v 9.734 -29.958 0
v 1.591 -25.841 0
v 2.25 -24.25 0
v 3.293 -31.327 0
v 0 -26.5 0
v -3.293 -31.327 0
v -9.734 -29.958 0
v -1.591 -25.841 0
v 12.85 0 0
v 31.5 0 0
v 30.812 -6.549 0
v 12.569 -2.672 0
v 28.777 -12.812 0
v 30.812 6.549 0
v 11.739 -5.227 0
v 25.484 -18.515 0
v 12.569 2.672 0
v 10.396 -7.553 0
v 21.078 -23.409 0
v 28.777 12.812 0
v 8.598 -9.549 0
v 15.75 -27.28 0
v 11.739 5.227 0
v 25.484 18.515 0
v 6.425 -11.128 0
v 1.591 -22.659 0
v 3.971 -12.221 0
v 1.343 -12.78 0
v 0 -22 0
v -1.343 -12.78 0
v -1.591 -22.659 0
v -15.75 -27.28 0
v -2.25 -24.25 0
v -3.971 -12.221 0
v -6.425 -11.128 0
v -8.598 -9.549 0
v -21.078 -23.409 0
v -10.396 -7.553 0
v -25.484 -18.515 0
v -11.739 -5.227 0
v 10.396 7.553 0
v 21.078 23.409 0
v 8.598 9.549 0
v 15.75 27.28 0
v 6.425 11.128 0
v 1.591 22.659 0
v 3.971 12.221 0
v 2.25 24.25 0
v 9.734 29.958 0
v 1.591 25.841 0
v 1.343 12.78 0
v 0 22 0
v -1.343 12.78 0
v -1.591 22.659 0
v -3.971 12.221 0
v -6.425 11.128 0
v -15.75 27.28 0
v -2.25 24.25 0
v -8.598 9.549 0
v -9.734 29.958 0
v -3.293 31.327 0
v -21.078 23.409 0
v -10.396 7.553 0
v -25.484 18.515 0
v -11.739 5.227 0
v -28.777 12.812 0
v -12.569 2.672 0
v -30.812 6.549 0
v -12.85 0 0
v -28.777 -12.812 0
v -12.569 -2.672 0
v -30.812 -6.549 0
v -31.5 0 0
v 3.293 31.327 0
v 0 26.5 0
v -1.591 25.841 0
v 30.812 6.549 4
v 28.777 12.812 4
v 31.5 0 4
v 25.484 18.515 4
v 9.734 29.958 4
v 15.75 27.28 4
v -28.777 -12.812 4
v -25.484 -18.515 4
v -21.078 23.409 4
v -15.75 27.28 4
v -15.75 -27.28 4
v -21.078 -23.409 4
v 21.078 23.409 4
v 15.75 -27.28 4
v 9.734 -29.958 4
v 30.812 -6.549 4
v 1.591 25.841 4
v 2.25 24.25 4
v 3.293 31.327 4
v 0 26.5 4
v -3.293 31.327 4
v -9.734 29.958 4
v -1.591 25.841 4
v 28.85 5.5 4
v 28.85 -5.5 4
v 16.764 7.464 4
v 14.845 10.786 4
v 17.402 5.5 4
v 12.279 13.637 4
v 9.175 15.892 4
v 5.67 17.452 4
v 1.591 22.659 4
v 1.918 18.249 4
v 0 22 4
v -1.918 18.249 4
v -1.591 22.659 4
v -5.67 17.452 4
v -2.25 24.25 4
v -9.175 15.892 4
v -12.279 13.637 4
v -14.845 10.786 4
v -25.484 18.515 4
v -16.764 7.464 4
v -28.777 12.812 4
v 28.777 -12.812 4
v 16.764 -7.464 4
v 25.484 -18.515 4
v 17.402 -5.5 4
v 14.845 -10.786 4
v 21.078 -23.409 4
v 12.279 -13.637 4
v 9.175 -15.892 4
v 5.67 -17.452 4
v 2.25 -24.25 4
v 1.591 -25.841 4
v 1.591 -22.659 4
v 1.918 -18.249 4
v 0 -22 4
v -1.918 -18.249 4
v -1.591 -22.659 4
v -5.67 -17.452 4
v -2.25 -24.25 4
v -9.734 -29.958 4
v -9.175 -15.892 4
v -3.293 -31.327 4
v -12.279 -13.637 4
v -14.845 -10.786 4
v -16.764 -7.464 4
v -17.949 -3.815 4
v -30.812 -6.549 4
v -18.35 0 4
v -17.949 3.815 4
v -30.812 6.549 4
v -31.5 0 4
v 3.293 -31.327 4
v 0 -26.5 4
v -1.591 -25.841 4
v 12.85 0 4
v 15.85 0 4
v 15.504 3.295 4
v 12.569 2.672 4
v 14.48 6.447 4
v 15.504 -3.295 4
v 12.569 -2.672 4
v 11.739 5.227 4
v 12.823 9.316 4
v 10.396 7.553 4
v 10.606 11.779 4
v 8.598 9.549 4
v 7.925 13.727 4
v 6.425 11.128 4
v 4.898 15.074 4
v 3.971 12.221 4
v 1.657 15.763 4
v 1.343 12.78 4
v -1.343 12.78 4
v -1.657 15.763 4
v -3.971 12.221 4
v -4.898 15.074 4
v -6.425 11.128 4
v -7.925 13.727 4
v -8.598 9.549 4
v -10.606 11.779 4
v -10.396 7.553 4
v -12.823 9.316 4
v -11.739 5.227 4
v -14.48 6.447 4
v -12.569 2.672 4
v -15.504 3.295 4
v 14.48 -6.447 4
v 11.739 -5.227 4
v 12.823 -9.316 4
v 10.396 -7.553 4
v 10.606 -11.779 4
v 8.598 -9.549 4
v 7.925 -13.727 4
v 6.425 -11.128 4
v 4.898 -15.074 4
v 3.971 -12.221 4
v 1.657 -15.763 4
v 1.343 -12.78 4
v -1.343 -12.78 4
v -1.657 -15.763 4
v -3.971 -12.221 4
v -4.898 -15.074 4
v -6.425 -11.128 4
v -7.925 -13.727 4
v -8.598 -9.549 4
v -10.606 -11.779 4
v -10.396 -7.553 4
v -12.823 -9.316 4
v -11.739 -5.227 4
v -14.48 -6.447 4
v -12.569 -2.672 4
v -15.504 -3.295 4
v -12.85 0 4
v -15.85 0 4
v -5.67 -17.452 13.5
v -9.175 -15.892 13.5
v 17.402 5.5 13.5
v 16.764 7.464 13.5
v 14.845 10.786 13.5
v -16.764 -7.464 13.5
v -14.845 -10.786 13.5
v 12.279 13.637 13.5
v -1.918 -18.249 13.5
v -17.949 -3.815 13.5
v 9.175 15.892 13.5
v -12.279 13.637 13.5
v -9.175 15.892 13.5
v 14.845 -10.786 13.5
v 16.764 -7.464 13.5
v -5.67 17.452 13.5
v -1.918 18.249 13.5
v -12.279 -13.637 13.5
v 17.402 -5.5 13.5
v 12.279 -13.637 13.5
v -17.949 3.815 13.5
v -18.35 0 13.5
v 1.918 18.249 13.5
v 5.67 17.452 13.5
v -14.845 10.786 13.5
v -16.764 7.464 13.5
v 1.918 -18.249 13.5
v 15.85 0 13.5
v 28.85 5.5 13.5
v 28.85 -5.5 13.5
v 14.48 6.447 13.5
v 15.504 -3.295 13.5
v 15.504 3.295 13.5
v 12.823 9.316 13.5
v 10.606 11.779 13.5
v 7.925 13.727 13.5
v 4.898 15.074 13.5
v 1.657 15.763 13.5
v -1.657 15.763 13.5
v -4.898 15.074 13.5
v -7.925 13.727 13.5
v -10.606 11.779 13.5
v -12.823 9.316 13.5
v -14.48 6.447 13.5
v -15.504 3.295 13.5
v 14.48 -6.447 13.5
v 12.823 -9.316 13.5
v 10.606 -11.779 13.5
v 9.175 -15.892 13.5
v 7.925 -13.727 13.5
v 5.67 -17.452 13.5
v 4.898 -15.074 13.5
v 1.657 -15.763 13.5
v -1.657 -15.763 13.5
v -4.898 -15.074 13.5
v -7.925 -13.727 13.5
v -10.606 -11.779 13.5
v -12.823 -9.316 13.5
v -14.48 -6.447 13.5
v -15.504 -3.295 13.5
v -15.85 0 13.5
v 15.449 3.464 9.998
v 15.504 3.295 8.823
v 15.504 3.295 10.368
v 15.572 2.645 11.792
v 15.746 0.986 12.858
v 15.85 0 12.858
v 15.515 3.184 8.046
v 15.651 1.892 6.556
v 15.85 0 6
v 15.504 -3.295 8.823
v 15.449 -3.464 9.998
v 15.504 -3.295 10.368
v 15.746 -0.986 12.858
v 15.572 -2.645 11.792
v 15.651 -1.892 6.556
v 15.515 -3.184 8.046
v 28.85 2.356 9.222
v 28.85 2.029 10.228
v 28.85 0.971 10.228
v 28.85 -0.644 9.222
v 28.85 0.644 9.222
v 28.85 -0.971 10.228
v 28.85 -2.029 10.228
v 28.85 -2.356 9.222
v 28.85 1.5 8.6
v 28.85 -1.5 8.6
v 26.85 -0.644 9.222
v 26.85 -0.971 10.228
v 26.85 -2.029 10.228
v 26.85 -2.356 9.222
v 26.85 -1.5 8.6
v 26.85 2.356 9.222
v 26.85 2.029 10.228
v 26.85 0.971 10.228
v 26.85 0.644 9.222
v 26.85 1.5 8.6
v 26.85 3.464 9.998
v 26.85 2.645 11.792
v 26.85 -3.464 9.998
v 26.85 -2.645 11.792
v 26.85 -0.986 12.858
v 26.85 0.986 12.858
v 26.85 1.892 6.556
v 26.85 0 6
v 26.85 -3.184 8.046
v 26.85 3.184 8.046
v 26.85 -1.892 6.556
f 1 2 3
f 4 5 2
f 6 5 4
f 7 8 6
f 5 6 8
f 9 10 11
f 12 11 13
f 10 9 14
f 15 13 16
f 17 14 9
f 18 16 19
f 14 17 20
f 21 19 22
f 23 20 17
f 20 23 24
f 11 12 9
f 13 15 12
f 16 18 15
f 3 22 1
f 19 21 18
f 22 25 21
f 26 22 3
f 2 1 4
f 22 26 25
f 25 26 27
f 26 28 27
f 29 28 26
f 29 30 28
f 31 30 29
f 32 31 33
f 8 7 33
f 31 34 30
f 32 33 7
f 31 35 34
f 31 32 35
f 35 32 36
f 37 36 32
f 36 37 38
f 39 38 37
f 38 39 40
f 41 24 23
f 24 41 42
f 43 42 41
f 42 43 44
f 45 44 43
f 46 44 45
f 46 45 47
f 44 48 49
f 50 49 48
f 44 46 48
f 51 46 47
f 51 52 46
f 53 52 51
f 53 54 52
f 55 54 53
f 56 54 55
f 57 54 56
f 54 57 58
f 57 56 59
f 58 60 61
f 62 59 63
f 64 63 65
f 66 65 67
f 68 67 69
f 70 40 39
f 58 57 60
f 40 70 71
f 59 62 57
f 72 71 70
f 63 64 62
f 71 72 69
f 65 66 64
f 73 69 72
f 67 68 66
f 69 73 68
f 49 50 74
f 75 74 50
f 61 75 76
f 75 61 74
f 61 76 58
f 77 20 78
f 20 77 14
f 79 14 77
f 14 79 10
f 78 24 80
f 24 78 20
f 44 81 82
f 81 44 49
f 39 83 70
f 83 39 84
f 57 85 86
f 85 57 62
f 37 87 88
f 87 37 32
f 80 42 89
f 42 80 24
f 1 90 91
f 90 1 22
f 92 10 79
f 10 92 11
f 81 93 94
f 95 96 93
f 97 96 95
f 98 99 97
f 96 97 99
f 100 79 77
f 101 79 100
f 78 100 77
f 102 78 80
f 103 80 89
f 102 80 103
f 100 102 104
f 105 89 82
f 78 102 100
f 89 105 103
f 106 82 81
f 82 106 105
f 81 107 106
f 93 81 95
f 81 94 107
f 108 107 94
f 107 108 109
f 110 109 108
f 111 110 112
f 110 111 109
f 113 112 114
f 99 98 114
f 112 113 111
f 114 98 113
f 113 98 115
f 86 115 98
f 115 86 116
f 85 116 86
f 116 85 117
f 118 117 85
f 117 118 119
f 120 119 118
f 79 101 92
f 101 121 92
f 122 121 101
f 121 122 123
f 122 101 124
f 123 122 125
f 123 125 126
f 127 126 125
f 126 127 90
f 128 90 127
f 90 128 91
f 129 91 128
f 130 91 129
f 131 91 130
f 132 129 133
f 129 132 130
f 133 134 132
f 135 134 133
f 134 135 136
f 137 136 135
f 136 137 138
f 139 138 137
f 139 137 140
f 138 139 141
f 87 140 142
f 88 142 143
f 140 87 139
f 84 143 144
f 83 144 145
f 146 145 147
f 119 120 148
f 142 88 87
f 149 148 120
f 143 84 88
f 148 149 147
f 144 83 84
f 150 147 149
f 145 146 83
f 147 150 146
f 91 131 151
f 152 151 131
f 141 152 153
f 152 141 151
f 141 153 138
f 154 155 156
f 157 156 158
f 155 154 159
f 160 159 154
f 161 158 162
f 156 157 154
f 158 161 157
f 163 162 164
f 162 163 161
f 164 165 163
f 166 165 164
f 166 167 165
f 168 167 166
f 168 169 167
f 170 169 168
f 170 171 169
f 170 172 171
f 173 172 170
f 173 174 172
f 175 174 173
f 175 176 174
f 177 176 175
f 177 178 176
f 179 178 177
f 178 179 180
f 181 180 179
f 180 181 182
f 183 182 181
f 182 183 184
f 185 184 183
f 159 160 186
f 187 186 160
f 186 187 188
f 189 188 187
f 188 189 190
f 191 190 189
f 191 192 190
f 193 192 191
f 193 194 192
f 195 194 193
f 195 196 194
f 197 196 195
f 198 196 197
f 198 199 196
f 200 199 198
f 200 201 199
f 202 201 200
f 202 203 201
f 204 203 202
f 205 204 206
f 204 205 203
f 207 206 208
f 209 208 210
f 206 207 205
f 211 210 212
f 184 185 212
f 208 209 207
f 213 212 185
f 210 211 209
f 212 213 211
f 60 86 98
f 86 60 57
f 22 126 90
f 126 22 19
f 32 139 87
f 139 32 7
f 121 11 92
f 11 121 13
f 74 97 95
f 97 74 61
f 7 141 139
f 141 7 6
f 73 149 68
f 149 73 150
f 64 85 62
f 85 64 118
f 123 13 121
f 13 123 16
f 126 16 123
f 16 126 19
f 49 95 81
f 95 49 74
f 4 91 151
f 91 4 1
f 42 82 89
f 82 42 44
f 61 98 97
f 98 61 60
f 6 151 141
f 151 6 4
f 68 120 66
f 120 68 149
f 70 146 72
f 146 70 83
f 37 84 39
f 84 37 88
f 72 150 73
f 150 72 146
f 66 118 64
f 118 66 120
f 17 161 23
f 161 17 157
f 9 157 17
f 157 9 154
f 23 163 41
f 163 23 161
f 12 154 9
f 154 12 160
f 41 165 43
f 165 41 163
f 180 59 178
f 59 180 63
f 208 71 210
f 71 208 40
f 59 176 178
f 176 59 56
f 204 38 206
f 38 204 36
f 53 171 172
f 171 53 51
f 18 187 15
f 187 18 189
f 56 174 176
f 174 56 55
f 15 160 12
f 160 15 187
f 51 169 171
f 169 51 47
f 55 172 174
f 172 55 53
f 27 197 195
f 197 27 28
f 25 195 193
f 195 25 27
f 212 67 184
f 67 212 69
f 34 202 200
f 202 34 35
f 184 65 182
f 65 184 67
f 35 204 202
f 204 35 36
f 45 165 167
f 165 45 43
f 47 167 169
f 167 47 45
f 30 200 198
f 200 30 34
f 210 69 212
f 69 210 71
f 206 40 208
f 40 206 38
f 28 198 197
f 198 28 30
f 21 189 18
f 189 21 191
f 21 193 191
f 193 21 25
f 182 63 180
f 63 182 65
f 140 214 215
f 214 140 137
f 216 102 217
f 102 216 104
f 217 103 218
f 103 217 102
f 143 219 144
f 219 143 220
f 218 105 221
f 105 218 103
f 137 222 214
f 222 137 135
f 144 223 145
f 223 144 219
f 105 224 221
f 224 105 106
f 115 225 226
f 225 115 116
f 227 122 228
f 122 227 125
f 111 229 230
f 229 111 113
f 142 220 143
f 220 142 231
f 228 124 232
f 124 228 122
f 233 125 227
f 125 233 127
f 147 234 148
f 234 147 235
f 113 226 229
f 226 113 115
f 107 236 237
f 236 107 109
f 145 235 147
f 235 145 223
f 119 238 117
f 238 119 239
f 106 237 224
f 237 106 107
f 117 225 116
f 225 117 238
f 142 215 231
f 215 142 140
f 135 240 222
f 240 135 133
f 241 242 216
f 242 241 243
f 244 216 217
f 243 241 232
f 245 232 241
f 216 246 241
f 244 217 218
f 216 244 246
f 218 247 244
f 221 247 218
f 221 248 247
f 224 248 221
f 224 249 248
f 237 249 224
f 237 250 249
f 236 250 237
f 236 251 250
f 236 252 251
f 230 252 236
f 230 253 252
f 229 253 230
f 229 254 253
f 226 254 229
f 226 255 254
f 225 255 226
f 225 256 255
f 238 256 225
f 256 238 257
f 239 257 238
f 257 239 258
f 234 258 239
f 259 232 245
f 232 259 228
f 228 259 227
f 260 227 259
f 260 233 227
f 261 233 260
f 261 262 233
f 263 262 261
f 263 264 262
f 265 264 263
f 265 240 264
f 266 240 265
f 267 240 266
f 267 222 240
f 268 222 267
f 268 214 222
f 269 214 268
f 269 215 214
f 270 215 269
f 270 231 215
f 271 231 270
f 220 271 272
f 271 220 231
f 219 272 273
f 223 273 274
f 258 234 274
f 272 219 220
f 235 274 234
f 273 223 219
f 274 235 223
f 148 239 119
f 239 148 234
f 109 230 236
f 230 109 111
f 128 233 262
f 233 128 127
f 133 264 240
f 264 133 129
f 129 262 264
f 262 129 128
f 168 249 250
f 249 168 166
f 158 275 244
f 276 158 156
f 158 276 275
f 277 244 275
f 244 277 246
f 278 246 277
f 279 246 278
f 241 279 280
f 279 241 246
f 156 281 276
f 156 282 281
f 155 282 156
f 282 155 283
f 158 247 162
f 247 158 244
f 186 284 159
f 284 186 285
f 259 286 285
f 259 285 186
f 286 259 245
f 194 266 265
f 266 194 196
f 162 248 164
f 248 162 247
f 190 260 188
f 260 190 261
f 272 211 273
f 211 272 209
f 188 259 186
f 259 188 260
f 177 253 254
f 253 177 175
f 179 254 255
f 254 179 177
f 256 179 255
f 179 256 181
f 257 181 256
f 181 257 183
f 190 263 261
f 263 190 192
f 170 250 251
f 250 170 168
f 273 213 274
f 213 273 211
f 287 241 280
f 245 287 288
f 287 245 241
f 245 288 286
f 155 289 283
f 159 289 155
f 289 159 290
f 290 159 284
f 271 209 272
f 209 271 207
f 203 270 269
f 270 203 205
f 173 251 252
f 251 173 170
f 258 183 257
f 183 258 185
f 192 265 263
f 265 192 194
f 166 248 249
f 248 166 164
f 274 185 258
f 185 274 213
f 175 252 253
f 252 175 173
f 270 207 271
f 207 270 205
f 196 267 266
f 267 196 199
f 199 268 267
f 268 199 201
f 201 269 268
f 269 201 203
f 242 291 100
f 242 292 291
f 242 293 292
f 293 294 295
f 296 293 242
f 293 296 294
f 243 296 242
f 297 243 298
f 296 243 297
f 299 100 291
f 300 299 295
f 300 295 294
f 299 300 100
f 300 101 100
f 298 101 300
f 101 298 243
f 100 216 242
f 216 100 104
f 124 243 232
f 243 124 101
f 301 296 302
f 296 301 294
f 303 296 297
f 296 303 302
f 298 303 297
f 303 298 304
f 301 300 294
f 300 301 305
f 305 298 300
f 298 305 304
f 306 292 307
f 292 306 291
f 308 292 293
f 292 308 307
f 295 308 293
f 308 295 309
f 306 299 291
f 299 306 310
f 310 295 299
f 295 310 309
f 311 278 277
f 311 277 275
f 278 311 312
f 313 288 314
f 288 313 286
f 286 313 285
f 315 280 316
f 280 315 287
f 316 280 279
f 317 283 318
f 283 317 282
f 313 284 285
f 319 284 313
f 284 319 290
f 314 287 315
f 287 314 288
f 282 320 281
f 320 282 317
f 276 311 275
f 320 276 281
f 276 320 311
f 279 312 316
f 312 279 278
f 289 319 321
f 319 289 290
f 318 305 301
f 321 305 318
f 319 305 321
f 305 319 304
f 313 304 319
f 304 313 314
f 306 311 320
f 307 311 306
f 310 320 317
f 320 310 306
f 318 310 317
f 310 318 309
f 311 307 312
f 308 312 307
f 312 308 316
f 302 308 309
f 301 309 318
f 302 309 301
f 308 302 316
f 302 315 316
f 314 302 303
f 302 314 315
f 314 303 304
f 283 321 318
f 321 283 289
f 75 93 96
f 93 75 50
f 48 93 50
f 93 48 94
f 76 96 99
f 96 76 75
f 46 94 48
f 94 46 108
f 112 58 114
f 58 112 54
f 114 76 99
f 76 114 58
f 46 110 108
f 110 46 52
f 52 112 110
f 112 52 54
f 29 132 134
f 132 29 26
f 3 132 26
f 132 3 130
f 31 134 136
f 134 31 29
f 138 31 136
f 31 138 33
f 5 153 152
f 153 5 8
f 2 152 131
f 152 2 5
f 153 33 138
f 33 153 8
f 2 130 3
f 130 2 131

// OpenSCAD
// Connection base
// This file contains 2 separate elements:
// * a static base, fixed to the motor;
// * a rotating cylinder, fixed to the sphere.
// It is used to add a LED and light sensor to detect a reference angle.

// Wire
wire_diam = 1.8;
// Motor base
base_diam = 63;
base_height = 4.0;
// Base screw
base_screw_diam = 4.5;
base_screw_sep = 48.5;
// Base hole
base_hole_height = base_height;
base_hole_diam = 25.7;
// Rotating cylinder
cyl_offset = base_height + 1;
cyl_height = 15;
cyl_in_diam = 20.2;
cyl_width = 2.5;
cyl_wire_width = 2.5;
cyl_wire_space = 14;
// Rotating screw
cyl_screw_offset = 13.3;
cyl_screw_diam = 4.1;
// light sensor
sensor_offset = 0.5;
sensor_diam = 7;
// LED cache
cache_width = 2.5;
cache_height = cyl_offset + sensor_offset + sensor_diam + 1;
cache_diam = cyl_in_diam + (cyl_width + cyl_wire_width)*2 + 1.5;
// LED box
led_length = 11;
led_diam = 7;
led_box_width = 2;

// Non-moving part
module base() {
	difference() {
		union() {
			difference() {
				union() {
					difference() {
						// Base
						cylinder(h = base_height, r = base_diam/2);
						// Bottom hole
						cylinder(h = base_hole_height, r = base_hole_diam/2);
						
					}
					// LED circular cache
					difference() {
						// Cylinder
						cylinder(h = cache_height, r = cache_diam/2 + cache_width);
						// Inside diameter
						cylinder(h = cyl_height, r = cache_diam/2);
					}
					// LED box
					translate([cache_diam/2, - led_diam/2 - led_box_width, 0]) {
						difference() {
							cube([led_length + led_box_width, led_diam + 2 * led_box_width, cache_height]);
							translate([0, led_box_width*2, led_diam/2 + base_height + led_box_width])
								rotate([0, 90, 0])
									cylinder(h = led_length + led_box_width, r = wire_diam/2);
							translate([0, led_diam, led_diam/2 + base_height + led_box_width])
								rotate([0, 90, 0])
									cylinder(h = led_length + led_box_width, r = wire_diam/2);
						}
					}
				}
				// LED space
				translate([cache_diam/2-1, 0, led_diam/2 + base_height + led_box_width])
					rotate([0, 90, 0])
						cylinder(h = led_length+1, r = led_diam/2);
			}
		}
		// Screws
		translate([0,base_screw_sep/2,0])
			cylinder(h = cache_height, r = base_screw_diam/2);
		translate([0,-base_screw_sep/2,0])
			cylinder(h = cache_height, r = base_screw_diam/2);
	}
}

// Rotating part
module cyl() {
	translate([0, 0, cyl_offset]) {
		union() {
			difference() {
				// Cylinder
				cylinder(h = cyl_height, r = cyl_in_diam/2 + cyl_width + cyl_wire_width);
				// Inside diameter
				cylinder(h = cyl_height, r = cyl_in_diam/2);
				// Wire space
				intersection() {
					cylinder(h = cyl_height, r = cyl_in_diam/2 + cyl_wire_width);
					translate([-(cyl_in_diam/2 + cyl_width + cyl_wire_width), -cyl_wire_space/2, 0])
						cube([cyl_in_diam+(cyl_width+cyl_wire_width)*2, cyl_wire_space, cyl_height]);
				}
				// Screw
				translate([0, 0, cyl_screw_offset + cyl_screw_diam/2 - cyl_offset])
					rotate([90, 0, 0])
						cylinder(h = cyl_in_diam+(cyl_width+cyl_wire_width)*2, r = cyl_screw_diam/2, center=true);
				// Light sensor
				translate([cyl_in_diam/2 + cyl_wire_width - 1, 0, sensor_offset + sensor_diam/2])
					rotate([0, 90, 0])
						cylinder(h = cyl_width + 2, r=sensor_diam/2);
			}
		}
	}
}

// Non-moving part
base();
// Rotating part
//cyl();
